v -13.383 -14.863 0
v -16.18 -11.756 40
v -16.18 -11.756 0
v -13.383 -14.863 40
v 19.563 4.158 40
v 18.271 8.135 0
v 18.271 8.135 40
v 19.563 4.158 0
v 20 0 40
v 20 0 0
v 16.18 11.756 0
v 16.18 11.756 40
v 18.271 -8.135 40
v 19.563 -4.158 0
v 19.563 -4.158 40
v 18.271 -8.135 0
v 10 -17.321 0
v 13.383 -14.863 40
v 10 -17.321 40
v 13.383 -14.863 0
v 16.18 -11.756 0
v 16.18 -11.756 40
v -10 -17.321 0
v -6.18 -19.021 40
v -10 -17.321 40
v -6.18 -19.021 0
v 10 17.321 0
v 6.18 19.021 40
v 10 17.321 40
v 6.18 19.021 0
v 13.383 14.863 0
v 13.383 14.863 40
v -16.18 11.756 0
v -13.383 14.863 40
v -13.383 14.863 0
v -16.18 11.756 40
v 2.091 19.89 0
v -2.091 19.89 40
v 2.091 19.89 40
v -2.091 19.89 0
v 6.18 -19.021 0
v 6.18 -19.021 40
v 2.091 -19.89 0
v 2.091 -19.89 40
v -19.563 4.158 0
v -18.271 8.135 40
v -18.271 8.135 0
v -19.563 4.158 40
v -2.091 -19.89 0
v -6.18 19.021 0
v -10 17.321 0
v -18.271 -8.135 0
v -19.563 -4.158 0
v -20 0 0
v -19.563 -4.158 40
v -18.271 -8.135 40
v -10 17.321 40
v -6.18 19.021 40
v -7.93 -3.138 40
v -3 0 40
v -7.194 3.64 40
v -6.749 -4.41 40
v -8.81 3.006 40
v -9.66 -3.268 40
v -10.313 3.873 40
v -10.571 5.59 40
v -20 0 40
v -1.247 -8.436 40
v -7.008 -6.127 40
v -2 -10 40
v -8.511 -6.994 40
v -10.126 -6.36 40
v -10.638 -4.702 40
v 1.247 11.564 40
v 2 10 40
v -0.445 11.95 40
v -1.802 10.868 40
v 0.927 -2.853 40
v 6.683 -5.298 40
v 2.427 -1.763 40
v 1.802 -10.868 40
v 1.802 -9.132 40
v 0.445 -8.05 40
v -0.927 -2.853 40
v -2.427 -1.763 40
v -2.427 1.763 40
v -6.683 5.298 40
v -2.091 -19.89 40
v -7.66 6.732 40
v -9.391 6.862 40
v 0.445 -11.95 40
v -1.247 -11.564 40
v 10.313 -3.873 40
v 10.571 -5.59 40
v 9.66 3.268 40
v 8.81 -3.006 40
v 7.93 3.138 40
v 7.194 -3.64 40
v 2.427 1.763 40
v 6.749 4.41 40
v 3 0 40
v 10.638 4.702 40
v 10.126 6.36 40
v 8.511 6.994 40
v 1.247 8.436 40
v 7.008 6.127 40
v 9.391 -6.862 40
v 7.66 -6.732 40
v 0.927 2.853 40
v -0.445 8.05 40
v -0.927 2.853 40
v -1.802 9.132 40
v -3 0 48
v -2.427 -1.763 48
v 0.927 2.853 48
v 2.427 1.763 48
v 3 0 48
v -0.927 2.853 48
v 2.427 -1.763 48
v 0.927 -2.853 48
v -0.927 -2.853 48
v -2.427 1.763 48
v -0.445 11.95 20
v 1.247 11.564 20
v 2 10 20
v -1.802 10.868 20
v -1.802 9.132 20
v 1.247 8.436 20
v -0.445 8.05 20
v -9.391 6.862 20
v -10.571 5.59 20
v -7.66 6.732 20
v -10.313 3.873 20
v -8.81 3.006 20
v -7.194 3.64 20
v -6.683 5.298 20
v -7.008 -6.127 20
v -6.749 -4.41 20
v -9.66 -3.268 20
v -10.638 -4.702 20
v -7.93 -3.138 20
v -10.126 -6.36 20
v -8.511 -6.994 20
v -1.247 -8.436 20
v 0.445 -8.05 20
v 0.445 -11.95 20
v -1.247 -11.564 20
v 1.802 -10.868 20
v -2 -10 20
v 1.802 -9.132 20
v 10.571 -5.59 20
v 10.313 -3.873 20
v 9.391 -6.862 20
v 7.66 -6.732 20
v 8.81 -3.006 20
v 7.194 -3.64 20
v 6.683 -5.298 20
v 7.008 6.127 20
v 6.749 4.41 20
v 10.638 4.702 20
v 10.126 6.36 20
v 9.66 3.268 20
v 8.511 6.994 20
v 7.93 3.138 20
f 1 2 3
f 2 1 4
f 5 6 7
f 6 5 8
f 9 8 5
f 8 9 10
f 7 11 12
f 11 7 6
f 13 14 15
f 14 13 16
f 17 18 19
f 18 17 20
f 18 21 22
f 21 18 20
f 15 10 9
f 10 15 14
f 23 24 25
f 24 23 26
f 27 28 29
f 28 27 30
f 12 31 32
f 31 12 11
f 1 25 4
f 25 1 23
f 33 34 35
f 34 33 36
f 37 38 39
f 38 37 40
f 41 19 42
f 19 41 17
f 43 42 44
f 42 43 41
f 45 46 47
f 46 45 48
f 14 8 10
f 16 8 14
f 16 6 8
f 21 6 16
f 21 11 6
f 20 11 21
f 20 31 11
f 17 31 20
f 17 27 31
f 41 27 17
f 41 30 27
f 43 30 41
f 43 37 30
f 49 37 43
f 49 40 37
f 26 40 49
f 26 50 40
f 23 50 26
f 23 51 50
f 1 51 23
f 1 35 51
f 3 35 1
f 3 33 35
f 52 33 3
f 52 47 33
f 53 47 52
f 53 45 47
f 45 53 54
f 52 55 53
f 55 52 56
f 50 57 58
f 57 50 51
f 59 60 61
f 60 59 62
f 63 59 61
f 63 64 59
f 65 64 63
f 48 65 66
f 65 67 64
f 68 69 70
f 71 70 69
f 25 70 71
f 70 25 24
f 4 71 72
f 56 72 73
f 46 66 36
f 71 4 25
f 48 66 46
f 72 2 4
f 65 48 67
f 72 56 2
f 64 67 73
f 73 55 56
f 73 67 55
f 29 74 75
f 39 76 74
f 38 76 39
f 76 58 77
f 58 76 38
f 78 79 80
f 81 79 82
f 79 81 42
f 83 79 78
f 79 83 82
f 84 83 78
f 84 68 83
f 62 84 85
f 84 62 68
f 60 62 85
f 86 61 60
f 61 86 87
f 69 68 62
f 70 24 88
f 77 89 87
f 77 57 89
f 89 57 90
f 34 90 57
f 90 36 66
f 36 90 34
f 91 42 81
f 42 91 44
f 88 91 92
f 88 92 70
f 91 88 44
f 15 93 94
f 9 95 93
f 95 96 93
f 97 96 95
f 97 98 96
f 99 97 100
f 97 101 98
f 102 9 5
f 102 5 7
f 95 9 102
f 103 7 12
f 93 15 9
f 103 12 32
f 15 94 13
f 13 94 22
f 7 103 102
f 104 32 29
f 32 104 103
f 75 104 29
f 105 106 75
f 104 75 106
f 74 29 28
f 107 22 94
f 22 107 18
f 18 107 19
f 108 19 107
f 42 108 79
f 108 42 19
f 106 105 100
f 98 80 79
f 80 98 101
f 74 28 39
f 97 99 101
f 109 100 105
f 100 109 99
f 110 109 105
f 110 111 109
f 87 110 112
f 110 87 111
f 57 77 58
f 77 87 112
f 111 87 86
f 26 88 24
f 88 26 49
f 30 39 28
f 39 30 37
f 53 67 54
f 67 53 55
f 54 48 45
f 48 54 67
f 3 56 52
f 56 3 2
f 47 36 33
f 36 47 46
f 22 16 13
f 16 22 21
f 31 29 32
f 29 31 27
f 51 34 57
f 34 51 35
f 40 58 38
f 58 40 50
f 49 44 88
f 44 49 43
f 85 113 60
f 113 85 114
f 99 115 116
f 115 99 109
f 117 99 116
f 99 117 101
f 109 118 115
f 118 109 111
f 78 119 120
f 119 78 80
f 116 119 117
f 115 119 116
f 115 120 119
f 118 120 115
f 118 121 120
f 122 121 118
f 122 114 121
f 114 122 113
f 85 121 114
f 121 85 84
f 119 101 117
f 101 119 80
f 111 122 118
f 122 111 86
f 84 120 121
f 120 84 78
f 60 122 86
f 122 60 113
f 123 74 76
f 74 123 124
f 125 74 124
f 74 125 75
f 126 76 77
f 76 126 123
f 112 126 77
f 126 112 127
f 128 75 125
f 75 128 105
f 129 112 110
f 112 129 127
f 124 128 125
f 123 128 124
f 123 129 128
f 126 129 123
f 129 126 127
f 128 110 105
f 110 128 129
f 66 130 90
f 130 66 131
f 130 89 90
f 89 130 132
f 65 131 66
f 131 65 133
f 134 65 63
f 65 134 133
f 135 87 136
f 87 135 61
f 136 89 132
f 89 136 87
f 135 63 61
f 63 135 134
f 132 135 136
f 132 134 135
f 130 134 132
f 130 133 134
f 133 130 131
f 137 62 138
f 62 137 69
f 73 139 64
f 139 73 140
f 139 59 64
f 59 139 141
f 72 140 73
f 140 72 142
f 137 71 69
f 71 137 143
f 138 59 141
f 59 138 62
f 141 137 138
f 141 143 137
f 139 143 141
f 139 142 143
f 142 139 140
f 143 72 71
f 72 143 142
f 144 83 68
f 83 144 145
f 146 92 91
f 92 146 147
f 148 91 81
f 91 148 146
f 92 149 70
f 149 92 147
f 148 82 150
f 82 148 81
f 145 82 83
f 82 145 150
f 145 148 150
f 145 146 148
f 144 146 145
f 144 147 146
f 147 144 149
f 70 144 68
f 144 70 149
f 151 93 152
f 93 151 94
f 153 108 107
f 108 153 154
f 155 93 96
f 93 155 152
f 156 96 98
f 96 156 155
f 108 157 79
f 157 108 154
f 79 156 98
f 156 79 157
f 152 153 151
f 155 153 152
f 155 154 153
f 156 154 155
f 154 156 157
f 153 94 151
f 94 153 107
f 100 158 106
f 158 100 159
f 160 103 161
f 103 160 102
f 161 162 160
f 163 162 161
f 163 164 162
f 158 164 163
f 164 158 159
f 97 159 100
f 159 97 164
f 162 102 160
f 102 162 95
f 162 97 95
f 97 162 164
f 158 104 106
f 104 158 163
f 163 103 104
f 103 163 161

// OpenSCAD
// file: configuration.scad
/* ROTARY ENCODER DIMENSIONS */

// Main body size:
enc_body_radius = 20;
enc_body_length = 40;

// Shaft parameters
enc_shaft_radius = 3;
enc_shaft_length = 8;

// Mount screw parameters:
enc_screw_count = 6;
enc_screw_distance_from_center = 10;
enc_screw_depth = 20;
enc_screw_radius = 2;
// main file
include <configuration.scad>

module encoderSolid(){

// Encoder body:
cylinder(r=enc_body_radius, h=enc_body_length);
// Encoder shaft:
cylinder(r=enc_shaft_radius, h=enc_shaft_length + enc_body_length);

}

module screwHoles(){
  for(z=[0:enc_screw_count]){

	rotate( a = 360 / enc_screw_count * z, v=[0, 0, 1]){
      translate([ 0, enc_screw_distance_from_center, enc_body_length - enc_screw_depth ]){

        cylinder(r = enc_screw_radius, h=enc_screw_depth);
      }
    }
  }
}

difference(){
	encoderSolid();
	screwHoles();
}
